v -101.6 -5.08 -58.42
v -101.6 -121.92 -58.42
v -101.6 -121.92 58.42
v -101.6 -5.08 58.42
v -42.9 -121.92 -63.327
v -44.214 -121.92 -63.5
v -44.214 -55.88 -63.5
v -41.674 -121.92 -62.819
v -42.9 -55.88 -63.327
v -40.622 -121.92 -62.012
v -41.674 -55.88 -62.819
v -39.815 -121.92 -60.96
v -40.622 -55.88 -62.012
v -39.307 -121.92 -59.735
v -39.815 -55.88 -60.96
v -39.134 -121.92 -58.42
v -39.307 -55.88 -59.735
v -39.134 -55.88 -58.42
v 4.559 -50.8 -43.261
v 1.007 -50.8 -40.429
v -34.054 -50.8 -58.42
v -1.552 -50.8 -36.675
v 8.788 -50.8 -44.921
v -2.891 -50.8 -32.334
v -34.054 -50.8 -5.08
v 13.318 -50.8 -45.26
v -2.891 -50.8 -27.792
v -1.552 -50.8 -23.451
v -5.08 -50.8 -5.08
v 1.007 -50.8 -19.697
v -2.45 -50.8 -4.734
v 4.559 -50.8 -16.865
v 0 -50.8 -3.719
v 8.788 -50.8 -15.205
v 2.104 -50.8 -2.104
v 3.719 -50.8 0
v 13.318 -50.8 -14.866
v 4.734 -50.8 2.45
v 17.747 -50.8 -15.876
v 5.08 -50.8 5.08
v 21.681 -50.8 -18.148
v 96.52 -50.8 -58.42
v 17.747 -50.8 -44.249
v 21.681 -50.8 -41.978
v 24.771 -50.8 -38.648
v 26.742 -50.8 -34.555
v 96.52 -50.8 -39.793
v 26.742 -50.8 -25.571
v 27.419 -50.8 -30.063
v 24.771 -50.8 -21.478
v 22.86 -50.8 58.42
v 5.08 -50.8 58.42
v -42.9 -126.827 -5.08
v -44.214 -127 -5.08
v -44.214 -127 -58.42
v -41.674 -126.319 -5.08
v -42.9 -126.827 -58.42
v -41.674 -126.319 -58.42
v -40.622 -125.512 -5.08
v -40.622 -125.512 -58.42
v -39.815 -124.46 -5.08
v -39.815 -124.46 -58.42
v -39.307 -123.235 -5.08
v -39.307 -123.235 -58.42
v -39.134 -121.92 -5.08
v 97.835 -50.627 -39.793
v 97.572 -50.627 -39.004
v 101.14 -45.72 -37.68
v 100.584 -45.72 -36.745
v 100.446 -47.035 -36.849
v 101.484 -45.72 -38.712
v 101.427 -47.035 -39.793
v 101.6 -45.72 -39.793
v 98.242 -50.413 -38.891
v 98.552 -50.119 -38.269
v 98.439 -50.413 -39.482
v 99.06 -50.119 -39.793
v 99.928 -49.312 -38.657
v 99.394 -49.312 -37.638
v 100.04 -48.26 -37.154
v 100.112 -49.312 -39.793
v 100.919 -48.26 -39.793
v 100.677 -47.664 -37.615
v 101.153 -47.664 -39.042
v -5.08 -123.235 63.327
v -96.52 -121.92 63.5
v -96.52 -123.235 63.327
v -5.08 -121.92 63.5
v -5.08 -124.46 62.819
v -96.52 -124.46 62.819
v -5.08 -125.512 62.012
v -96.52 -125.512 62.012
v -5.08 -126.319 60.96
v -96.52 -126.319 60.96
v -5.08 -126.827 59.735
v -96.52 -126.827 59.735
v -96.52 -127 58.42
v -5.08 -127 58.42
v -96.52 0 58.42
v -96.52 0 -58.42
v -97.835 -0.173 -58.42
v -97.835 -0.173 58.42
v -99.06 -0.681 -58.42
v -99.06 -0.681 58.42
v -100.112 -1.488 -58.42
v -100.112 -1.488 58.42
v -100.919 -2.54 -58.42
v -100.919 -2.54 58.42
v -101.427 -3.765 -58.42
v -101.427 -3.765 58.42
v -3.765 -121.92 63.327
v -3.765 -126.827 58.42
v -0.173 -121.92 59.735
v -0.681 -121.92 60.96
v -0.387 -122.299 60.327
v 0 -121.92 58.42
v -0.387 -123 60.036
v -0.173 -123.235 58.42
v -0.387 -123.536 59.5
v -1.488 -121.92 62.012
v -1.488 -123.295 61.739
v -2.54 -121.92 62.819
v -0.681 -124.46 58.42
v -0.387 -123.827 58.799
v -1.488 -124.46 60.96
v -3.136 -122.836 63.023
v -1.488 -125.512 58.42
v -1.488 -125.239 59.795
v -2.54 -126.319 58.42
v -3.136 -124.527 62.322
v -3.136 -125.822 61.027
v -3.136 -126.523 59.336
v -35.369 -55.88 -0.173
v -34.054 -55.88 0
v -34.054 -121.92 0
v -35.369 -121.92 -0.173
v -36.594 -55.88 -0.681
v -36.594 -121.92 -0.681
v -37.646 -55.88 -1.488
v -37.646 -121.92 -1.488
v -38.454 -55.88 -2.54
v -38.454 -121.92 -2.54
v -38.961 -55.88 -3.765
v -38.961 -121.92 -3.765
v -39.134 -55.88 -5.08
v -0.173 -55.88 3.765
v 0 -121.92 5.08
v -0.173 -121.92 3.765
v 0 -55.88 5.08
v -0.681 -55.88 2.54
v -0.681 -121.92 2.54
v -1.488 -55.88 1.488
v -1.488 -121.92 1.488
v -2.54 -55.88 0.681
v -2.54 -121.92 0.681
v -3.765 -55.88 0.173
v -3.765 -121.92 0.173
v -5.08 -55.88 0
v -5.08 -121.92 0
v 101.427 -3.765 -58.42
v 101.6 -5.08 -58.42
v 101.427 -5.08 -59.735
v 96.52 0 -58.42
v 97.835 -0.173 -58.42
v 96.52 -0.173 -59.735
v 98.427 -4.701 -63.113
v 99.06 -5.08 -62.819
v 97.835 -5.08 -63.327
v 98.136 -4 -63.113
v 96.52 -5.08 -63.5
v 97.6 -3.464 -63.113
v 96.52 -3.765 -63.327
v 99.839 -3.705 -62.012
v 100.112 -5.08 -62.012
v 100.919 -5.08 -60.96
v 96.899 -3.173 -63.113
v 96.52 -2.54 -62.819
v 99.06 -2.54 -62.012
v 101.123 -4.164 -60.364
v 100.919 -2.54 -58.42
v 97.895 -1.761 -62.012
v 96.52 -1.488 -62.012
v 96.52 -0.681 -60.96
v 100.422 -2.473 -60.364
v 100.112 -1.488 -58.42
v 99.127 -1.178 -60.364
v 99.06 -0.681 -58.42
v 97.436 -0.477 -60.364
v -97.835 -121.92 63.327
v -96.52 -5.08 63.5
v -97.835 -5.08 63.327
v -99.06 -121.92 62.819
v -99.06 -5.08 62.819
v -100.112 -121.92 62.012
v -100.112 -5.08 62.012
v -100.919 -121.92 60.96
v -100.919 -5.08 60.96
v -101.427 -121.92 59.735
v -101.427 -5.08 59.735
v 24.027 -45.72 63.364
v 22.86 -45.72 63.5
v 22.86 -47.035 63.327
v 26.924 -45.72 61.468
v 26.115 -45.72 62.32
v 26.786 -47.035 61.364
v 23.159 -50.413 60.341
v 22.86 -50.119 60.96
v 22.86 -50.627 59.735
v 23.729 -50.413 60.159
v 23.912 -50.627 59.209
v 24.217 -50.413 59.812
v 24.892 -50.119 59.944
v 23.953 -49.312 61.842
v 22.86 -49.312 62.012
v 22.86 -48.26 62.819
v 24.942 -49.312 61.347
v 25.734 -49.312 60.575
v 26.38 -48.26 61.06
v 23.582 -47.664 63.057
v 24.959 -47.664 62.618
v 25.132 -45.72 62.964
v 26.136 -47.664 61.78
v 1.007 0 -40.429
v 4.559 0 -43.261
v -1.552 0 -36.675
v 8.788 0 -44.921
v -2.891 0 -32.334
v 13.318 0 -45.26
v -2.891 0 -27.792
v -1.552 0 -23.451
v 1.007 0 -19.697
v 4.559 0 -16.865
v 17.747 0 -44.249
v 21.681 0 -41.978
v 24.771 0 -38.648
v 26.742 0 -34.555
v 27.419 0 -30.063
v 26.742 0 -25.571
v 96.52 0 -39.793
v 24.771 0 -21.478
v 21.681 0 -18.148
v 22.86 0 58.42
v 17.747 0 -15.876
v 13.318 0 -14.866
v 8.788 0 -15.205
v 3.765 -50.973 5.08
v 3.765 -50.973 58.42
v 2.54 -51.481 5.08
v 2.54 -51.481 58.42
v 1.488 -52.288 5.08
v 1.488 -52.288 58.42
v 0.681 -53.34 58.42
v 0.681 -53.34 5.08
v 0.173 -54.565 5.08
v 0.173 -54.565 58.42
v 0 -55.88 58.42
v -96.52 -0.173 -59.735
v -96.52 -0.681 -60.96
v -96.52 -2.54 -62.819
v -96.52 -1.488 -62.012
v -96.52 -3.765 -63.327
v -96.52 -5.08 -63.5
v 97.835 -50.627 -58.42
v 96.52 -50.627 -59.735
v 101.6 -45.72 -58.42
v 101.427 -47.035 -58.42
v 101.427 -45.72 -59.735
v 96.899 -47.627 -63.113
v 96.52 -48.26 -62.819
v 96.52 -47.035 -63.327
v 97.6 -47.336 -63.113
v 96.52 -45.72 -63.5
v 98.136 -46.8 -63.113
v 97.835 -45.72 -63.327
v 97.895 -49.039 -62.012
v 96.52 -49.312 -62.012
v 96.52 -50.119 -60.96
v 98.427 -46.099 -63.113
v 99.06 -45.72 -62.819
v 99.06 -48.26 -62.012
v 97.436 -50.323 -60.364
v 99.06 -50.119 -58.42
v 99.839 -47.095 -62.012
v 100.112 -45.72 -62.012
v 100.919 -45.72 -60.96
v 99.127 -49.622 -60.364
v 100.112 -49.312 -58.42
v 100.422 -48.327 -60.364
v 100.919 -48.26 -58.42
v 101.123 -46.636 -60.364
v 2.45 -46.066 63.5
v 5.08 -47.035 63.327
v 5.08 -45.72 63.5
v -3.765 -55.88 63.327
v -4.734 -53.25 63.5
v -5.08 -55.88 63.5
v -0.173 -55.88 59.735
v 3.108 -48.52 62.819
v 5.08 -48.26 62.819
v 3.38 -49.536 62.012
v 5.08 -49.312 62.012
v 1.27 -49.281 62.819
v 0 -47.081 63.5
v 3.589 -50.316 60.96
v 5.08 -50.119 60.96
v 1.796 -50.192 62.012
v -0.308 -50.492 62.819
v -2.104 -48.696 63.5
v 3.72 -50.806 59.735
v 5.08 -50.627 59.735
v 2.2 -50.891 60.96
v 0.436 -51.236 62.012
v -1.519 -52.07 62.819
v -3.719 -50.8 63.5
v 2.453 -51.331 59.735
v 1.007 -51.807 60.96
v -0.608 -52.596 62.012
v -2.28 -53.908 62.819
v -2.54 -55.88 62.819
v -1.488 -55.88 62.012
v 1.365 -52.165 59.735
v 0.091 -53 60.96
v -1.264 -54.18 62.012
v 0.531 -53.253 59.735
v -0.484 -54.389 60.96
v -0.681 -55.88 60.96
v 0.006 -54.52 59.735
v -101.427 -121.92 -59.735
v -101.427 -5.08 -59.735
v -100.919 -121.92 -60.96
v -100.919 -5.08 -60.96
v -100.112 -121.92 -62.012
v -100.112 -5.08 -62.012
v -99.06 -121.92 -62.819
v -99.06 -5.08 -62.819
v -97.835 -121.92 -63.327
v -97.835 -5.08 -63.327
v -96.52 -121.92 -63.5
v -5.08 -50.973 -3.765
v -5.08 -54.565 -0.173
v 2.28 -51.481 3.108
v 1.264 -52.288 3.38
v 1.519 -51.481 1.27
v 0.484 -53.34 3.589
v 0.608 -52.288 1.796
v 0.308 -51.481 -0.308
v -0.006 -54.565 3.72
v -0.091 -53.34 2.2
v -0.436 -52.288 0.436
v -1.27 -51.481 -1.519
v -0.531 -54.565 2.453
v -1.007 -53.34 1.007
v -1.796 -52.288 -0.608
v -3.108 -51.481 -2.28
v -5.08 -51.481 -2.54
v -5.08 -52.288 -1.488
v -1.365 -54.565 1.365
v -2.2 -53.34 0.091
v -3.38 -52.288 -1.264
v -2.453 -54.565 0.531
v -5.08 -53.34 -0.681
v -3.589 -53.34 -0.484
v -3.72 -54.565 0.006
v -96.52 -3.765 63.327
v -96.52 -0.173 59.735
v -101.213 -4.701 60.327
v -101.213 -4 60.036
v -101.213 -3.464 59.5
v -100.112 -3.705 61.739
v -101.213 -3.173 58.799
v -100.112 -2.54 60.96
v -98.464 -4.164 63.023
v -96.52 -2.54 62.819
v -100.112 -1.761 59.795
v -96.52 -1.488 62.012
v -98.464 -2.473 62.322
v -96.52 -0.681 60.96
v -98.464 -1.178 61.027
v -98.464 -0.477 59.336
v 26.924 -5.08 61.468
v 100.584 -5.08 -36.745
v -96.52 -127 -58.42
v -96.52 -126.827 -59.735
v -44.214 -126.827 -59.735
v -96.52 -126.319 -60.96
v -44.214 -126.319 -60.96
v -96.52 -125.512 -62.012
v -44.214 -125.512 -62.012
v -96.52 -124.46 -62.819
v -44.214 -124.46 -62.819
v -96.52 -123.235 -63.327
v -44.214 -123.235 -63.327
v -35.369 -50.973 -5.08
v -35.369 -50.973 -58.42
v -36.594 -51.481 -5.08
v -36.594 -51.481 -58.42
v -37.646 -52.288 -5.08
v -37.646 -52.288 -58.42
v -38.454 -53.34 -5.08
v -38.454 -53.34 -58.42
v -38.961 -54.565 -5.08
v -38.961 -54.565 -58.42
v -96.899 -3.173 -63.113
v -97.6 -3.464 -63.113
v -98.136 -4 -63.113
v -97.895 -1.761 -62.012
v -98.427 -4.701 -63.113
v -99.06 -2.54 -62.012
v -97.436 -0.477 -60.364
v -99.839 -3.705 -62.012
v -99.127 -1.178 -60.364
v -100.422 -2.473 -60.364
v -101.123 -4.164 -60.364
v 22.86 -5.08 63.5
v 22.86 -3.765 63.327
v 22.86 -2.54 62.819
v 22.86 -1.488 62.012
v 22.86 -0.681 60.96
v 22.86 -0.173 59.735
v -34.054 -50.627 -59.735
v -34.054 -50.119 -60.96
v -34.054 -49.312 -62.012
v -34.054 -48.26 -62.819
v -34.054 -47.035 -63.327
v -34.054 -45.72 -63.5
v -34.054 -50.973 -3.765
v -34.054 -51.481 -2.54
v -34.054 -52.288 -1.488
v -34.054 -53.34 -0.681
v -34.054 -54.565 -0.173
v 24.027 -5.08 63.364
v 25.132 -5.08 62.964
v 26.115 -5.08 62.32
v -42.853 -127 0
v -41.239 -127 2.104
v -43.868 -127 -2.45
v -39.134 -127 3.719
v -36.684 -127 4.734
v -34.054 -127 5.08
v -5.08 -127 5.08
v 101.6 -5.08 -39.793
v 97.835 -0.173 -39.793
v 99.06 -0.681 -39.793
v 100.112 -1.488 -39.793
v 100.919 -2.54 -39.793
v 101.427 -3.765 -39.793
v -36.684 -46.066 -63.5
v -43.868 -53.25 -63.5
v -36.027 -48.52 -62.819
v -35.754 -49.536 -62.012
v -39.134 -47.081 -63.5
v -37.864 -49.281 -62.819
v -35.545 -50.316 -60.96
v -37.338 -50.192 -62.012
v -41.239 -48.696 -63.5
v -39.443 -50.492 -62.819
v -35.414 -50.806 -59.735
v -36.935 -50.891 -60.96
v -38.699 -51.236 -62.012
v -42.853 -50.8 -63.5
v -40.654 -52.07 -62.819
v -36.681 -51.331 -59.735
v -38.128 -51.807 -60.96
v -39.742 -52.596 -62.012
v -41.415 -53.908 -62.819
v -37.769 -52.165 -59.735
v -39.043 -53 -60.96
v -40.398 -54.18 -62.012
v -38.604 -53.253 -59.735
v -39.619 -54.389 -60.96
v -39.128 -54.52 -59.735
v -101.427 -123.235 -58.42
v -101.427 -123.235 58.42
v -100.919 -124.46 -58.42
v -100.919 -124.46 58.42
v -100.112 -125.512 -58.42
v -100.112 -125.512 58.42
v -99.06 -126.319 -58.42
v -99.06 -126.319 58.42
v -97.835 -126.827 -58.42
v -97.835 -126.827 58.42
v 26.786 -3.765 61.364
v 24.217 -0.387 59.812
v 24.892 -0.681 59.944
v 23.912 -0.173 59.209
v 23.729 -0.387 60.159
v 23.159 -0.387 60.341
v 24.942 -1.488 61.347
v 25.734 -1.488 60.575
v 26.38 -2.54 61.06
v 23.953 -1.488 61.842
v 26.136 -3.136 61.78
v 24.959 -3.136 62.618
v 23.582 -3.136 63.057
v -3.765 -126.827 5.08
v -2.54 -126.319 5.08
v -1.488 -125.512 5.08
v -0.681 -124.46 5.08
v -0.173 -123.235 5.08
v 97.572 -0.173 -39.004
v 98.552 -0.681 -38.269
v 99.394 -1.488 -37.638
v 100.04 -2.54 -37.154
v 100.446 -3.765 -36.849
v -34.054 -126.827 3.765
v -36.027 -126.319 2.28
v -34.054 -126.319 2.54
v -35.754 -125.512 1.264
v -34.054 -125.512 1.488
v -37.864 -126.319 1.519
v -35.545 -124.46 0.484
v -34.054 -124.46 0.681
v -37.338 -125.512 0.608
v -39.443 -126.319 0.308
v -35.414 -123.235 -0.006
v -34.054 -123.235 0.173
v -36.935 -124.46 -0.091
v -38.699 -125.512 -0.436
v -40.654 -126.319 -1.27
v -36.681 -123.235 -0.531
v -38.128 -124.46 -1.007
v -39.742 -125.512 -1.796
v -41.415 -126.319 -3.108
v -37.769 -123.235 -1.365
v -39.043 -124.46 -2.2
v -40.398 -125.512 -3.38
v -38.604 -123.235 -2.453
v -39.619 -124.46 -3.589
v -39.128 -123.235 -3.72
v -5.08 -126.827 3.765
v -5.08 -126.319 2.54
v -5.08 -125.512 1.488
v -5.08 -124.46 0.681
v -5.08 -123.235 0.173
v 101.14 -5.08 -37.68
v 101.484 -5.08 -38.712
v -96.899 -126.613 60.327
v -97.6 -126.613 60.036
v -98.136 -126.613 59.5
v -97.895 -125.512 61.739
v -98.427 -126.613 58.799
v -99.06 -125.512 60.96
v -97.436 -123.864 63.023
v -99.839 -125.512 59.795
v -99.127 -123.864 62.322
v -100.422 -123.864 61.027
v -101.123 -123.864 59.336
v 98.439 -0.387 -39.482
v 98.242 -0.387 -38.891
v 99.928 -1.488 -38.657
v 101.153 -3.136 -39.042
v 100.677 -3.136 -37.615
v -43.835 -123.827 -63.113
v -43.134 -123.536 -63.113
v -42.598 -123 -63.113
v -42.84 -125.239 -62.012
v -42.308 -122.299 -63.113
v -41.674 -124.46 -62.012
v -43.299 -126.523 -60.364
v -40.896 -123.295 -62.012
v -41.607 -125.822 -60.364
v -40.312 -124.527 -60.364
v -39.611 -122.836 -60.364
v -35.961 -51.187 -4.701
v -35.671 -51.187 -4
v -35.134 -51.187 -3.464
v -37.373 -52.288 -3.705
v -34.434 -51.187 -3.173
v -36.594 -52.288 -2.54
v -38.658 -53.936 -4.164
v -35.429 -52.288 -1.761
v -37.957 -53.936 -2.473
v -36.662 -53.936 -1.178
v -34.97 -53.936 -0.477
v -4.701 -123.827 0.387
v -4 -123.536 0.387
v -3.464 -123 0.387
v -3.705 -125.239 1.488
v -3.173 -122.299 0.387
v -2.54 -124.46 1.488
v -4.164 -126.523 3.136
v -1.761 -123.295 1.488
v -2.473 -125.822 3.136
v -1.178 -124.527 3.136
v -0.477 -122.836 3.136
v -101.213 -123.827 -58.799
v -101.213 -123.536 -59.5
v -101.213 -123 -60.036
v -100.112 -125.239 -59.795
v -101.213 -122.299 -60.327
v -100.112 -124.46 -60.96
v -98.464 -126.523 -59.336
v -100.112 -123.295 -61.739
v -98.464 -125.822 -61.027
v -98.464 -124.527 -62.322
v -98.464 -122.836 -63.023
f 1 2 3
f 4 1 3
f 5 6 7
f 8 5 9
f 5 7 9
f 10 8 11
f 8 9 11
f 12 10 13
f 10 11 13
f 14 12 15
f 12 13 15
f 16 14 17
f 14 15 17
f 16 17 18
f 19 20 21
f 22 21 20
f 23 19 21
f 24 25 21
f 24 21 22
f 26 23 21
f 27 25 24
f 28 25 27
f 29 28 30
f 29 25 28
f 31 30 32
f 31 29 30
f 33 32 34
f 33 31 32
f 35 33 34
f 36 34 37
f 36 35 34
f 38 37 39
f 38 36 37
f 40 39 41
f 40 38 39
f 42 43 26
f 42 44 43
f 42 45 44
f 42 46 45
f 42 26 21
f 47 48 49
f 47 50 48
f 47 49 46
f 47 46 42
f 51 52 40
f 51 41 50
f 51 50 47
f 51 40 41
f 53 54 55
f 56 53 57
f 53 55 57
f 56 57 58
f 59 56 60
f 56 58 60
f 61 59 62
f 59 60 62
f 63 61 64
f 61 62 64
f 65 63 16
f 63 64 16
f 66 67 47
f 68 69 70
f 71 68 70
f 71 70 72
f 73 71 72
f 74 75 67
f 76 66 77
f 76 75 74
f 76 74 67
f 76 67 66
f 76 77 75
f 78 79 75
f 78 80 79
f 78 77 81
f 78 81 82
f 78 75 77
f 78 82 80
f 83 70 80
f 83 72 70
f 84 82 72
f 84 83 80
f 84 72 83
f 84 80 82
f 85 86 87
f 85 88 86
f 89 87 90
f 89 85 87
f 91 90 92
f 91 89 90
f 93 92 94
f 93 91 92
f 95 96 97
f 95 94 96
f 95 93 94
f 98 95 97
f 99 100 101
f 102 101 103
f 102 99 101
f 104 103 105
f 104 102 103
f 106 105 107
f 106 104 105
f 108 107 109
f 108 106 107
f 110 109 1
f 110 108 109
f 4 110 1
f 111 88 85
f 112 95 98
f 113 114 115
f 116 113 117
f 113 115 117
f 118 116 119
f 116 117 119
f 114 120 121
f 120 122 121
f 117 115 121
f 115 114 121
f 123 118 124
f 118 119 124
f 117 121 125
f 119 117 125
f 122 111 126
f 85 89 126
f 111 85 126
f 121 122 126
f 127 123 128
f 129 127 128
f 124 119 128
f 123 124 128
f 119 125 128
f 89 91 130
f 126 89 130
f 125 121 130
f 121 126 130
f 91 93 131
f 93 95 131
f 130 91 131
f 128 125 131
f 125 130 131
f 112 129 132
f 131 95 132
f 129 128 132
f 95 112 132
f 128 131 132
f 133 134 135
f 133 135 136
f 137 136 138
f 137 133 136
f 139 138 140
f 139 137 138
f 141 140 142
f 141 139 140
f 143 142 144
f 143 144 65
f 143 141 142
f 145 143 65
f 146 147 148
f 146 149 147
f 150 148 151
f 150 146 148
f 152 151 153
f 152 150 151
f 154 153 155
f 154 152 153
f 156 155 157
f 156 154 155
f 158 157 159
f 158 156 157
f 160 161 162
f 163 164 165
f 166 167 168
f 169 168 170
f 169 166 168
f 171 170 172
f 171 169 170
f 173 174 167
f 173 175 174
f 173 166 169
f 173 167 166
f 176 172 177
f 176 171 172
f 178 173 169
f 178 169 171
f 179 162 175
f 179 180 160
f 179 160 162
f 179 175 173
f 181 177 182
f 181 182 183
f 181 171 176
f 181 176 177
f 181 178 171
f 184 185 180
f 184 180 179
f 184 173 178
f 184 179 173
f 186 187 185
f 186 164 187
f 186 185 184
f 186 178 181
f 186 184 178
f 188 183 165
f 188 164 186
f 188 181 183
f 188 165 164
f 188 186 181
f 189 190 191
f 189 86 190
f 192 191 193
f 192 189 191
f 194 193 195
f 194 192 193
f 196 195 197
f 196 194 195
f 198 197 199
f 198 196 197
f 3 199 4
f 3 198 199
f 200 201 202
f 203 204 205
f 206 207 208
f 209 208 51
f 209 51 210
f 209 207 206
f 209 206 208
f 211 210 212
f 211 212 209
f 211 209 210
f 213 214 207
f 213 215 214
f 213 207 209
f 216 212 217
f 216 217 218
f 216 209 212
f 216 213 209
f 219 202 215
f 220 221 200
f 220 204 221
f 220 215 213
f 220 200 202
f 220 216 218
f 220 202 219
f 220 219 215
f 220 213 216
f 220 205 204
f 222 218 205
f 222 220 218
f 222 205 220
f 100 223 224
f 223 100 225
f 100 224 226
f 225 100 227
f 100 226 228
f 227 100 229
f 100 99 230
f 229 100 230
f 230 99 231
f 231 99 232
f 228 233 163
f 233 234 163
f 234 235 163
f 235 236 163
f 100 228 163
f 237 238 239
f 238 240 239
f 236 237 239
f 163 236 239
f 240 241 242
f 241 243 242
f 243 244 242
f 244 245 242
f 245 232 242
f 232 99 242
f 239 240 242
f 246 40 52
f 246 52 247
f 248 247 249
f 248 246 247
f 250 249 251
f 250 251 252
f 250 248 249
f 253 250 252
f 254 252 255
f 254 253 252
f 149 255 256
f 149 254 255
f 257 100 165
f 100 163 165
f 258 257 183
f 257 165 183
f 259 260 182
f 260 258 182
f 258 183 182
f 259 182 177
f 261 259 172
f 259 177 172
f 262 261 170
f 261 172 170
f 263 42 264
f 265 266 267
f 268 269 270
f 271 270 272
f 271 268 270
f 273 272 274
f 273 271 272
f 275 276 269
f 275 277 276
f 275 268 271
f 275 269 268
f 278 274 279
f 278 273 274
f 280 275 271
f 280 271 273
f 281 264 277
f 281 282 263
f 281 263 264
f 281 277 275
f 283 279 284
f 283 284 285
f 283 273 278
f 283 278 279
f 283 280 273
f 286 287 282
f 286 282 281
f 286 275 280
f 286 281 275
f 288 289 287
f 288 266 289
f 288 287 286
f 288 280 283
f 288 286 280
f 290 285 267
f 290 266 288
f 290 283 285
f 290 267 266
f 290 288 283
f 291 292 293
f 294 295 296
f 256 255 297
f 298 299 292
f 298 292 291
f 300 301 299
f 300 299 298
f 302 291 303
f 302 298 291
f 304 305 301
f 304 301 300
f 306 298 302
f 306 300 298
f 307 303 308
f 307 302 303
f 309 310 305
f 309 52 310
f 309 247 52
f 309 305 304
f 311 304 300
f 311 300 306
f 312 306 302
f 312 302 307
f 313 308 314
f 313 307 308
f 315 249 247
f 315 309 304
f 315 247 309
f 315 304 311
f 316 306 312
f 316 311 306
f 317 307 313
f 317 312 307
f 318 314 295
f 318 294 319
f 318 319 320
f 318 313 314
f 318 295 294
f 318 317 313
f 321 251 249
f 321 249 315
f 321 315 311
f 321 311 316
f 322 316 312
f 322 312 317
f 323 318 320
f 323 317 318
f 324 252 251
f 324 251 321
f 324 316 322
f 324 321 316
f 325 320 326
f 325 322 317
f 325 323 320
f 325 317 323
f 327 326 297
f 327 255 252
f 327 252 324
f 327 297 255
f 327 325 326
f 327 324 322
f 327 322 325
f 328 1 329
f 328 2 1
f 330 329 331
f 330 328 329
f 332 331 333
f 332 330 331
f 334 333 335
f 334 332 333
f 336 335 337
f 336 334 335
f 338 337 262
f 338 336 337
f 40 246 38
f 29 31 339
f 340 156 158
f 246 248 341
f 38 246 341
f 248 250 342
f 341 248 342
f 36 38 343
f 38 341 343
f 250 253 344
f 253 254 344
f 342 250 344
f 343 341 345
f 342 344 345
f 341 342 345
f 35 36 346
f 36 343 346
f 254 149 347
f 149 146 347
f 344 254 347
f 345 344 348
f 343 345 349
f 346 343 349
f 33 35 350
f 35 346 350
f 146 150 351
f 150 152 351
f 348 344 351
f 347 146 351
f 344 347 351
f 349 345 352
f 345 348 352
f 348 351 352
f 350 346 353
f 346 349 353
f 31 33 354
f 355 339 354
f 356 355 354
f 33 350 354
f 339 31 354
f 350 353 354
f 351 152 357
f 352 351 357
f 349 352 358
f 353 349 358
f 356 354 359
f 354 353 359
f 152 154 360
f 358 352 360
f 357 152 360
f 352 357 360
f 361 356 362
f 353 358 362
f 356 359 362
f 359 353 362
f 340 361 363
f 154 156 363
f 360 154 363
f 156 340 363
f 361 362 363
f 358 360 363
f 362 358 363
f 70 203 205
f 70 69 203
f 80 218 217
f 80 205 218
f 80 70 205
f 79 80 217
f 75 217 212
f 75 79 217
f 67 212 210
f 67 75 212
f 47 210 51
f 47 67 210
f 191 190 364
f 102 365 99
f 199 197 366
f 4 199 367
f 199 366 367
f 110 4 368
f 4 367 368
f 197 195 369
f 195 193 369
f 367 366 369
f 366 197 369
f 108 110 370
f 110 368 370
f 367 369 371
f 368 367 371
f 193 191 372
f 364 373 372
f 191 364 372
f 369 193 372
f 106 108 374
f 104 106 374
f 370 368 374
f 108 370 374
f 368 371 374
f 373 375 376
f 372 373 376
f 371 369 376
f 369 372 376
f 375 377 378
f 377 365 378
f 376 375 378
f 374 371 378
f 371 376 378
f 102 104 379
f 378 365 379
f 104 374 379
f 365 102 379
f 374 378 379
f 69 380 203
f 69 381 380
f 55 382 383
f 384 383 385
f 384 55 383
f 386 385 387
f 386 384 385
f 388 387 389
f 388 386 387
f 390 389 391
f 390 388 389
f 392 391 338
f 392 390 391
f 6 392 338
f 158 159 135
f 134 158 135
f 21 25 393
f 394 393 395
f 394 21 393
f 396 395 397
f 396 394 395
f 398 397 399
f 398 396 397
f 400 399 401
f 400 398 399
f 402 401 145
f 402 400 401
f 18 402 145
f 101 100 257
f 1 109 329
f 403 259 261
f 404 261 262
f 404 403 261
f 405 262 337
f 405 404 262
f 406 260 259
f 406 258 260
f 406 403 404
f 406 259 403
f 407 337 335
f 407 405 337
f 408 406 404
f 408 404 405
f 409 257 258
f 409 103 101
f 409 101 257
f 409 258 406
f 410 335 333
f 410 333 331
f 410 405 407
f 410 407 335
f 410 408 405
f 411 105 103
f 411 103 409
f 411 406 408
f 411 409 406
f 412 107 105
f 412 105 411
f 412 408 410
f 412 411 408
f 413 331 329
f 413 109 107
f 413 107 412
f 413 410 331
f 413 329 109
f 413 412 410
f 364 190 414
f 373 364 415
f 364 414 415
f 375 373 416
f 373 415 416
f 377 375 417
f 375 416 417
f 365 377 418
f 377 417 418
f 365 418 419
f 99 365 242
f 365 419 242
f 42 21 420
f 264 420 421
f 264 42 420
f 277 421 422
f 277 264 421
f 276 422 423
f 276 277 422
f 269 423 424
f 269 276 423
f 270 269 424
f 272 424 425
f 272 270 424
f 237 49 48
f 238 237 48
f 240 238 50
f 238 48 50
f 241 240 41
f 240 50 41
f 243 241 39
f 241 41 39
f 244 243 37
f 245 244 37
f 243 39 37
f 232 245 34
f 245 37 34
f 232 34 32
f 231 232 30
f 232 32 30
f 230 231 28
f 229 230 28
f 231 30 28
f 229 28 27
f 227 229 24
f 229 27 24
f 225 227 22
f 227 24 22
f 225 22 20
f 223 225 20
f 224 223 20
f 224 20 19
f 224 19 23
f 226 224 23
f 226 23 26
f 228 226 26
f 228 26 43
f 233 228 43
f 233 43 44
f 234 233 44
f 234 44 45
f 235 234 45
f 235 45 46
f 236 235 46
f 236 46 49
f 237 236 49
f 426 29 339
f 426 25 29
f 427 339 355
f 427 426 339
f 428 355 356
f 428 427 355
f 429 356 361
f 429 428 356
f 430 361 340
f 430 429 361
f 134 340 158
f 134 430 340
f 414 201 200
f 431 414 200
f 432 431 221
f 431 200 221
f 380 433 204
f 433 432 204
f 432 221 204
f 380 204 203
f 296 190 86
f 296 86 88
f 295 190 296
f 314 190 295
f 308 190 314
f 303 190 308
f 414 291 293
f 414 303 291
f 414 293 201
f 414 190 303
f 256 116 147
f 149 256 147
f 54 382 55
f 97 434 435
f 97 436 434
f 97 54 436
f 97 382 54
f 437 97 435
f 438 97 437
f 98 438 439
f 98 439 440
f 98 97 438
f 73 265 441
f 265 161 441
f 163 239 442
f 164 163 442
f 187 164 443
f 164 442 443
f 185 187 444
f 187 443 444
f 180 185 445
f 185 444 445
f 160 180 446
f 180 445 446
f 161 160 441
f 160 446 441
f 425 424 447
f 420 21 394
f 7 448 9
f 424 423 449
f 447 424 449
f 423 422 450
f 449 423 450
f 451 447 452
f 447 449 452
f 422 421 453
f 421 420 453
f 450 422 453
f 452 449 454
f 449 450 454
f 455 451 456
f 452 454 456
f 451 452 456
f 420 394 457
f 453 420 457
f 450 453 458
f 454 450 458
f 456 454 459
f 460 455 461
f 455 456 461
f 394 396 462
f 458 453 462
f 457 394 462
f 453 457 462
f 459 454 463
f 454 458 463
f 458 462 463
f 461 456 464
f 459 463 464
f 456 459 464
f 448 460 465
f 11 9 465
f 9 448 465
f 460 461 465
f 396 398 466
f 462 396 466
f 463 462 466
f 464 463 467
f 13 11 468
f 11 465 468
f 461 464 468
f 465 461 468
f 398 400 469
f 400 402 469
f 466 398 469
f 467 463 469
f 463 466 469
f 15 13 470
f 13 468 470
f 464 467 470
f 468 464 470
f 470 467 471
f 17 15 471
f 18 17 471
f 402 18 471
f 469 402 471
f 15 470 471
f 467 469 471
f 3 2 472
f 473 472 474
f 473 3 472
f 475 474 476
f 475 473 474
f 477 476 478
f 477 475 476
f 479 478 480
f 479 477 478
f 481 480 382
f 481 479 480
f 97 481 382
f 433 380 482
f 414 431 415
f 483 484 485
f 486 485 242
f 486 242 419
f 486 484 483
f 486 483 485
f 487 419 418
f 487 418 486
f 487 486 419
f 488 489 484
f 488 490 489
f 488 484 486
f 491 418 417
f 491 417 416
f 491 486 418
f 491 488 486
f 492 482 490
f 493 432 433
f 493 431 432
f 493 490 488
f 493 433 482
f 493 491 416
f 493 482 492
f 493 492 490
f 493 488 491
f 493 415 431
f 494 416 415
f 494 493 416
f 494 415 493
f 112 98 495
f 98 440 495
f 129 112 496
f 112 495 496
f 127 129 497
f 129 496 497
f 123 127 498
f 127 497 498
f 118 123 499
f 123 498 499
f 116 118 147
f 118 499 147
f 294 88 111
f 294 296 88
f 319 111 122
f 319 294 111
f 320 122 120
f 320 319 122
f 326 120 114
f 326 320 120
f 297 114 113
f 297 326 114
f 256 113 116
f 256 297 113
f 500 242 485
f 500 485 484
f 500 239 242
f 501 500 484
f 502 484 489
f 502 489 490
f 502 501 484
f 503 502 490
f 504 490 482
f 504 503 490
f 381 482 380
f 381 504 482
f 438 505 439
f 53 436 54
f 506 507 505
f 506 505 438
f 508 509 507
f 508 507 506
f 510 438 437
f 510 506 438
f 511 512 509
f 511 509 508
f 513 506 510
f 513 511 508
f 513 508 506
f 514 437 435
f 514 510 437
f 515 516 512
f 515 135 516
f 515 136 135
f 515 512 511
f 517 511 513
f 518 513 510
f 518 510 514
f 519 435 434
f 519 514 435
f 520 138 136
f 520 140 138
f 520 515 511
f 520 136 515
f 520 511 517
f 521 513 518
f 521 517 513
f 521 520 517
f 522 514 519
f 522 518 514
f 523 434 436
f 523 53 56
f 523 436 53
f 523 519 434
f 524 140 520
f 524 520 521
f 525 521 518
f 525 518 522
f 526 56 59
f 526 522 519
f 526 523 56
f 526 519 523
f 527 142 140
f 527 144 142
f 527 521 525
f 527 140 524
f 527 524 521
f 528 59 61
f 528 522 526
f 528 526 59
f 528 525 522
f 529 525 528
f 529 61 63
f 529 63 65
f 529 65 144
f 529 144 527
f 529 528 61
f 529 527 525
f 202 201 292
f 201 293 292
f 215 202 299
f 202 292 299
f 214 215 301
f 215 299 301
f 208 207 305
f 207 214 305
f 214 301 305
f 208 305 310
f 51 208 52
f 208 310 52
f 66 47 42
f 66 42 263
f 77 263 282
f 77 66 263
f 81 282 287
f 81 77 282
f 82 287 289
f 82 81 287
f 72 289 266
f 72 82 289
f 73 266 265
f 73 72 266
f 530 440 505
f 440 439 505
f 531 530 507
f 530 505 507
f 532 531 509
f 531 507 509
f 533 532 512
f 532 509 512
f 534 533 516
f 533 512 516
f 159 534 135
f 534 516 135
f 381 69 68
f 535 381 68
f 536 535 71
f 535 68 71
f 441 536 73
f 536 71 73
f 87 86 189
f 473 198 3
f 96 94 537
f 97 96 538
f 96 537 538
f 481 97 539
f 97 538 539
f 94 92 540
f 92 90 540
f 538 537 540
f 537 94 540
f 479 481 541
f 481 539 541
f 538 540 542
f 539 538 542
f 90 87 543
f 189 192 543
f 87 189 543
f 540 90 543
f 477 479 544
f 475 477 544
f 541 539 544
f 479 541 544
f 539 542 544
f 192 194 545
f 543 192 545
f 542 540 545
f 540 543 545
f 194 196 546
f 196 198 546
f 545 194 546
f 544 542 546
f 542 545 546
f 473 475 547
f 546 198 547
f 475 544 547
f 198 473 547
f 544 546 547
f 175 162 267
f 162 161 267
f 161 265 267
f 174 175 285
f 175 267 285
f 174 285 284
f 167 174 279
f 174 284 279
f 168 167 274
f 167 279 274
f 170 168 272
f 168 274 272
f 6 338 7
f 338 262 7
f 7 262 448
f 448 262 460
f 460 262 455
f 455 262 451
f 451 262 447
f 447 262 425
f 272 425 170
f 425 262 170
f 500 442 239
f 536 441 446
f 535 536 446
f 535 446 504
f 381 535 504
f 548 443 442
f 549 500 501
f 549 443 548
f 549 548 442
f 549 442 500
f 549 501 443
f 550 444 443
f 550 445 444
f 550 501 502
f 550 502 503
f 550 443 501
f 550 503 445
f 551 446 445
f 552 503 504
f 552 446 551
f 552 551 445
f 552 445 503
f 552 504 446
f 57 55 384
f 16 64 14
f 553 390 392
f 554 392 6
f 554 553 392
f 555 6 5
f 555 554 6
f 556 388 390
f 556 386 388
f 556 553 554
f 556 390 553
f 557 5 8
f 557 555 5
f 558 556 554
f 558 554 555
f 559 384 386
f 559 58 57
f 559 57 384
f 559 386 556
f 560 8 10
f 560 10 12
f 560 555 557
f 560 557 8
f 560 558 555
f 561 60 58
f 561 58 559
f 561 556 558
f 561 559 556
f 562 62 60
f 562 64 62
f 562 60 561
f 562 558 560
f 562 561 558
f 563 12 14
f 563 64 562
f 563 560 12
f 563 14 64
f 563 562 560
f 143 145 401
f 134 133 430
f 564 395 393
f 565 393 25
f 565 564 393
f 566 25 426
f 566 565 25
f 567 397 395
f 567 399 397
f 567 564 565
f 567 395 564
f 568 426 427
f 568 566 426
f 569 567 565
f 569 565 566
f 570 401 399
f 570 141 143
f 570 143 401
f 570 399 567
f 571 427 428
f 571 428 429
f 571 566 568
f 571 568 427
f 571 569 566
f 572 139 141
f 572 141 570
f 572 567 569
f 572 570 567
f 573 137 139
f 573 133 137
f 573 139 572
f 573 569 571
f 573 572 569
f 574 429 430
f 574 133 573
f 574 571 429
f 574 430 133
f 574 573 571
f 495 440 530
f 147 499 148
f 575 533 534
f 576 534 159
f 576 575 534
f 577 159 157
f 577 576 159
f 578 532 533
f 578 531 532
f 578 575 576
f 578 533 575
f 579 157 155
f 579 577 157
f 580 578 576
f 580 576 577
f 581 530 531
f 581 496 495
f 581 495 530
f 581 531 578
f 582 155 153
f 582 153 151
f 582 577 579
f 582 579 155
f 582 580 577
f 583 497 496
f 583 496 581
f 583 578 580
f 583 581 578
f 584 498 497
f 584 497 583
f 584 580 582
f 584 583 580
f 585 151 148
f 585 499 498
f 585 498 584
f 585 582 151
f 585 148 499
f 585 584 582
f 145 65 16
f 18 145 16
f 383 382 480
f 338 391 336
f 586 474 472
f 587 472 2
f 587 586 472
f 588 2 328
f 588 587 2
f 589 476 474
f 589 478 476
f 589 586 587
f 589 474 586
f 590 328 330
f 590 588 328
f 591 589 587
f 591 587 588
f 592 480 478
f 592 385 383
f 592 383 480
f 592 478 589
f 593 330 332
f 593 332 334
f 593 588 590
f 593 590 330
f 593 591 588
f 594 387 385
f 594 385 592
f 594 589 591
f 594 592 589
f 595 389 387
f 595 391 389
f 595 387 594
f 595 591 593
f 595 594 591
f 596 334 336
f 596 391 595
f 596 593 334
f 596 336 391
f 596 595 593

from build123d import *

# Parameters (mm, degrees)
F0_W     = 203.2
F0_H     = 127
F1_DEPTH = 127
F3_DEPTH = 76.2
F4_SIZE2 = 101.6
F4_SIZE  = 76.2
F5_R     = 5.08
F6_R     = 15.24
F7_DEPTH = 76.2


with BuildPart() as f1:
    # F0 (on Front) → F1 (new body)
    with BuildSketch(Plane.XZ):
        Rectangle(F0_W, F0_H)
    extrude(amount=F1_DEPTH)

    # F2 (on face) → F3 (cut)
    with BuildSketch(Plane.XZ.offset(127)):
        Polygon((101.6, 63.5), (0, 63.5), (0, 0), (-39.1343943775, 0), (-39.1343943775, -63.5), (101.6, -63.5), align=None)
    extrude(amount=-F3_DEPTH, mode=Mode.SUBTRACT)

    # F4
    f4_edges = [f1.edges().sort_by_distance(p)[0] for p in [
        (101.6, -25.4, 63.5),
    ]]
    f4_side = f1.faces().sort_by_distance((-21.771429, -52.614286, 63.5))[0]
    chamfer(f4_edges, length=F4_SIZE, length2=F4_SIZE2, reference=f4_side)

    # F5
    f5_edges = [f1.edges().sort_by_distance(p)[0] for p in [
        (-38.1, 0, 63.5),
        (25.4, -25.4, 63.5),
        (-101.6, -63.5, 63.5),
        (12.7, -50.8, 63.5),
        (-50.8, -127, 63.5),
        (0, -88.9, 63.5),
        (0, -127, 31.75),
        (-19.567197, -127, 0),
        (-39.134394, -127, -31.75),
        (-70.367197, -127, -63.5),
        (-101.6, -127, 0),
        (-39.134394, -88.9, 0),
        (-39.134394, -88.9, -63.5),
        (-39.134394, -50.8, -31.75),
        (0, -88.9, 0),
        (0, -50.8, 31.75),
        (63.5, -50.8, 12.7),
        (101.6, -50.8, -50.8),
        (-19.567197, -50.8, 0),
        (31.232803, -50.8, -63.5),
        (63.5, 0, 12.7),
        (101.6, -25.4, -38.1),
        (101.6, 0, -50.8),
        (101.6, -25.4, -63.5),
        (-101.6, 0, 0),
        (0, 0, -63.5),
        (-101.6, -63.5, -63.5),
    ]]
    fillet(f5_edges, radius=F5_R)

    # F6 (on face) → F7 (cut)
    with BuildSketch(Plane.XZ.offset(50.8)):
        with Locations((12.1788298711, -30.0629306585)):
            Circle(F6_R)
    extrude(amount=-F7_DEPTH, mode=Mode.SUBTRACT)


solid = f1.part
